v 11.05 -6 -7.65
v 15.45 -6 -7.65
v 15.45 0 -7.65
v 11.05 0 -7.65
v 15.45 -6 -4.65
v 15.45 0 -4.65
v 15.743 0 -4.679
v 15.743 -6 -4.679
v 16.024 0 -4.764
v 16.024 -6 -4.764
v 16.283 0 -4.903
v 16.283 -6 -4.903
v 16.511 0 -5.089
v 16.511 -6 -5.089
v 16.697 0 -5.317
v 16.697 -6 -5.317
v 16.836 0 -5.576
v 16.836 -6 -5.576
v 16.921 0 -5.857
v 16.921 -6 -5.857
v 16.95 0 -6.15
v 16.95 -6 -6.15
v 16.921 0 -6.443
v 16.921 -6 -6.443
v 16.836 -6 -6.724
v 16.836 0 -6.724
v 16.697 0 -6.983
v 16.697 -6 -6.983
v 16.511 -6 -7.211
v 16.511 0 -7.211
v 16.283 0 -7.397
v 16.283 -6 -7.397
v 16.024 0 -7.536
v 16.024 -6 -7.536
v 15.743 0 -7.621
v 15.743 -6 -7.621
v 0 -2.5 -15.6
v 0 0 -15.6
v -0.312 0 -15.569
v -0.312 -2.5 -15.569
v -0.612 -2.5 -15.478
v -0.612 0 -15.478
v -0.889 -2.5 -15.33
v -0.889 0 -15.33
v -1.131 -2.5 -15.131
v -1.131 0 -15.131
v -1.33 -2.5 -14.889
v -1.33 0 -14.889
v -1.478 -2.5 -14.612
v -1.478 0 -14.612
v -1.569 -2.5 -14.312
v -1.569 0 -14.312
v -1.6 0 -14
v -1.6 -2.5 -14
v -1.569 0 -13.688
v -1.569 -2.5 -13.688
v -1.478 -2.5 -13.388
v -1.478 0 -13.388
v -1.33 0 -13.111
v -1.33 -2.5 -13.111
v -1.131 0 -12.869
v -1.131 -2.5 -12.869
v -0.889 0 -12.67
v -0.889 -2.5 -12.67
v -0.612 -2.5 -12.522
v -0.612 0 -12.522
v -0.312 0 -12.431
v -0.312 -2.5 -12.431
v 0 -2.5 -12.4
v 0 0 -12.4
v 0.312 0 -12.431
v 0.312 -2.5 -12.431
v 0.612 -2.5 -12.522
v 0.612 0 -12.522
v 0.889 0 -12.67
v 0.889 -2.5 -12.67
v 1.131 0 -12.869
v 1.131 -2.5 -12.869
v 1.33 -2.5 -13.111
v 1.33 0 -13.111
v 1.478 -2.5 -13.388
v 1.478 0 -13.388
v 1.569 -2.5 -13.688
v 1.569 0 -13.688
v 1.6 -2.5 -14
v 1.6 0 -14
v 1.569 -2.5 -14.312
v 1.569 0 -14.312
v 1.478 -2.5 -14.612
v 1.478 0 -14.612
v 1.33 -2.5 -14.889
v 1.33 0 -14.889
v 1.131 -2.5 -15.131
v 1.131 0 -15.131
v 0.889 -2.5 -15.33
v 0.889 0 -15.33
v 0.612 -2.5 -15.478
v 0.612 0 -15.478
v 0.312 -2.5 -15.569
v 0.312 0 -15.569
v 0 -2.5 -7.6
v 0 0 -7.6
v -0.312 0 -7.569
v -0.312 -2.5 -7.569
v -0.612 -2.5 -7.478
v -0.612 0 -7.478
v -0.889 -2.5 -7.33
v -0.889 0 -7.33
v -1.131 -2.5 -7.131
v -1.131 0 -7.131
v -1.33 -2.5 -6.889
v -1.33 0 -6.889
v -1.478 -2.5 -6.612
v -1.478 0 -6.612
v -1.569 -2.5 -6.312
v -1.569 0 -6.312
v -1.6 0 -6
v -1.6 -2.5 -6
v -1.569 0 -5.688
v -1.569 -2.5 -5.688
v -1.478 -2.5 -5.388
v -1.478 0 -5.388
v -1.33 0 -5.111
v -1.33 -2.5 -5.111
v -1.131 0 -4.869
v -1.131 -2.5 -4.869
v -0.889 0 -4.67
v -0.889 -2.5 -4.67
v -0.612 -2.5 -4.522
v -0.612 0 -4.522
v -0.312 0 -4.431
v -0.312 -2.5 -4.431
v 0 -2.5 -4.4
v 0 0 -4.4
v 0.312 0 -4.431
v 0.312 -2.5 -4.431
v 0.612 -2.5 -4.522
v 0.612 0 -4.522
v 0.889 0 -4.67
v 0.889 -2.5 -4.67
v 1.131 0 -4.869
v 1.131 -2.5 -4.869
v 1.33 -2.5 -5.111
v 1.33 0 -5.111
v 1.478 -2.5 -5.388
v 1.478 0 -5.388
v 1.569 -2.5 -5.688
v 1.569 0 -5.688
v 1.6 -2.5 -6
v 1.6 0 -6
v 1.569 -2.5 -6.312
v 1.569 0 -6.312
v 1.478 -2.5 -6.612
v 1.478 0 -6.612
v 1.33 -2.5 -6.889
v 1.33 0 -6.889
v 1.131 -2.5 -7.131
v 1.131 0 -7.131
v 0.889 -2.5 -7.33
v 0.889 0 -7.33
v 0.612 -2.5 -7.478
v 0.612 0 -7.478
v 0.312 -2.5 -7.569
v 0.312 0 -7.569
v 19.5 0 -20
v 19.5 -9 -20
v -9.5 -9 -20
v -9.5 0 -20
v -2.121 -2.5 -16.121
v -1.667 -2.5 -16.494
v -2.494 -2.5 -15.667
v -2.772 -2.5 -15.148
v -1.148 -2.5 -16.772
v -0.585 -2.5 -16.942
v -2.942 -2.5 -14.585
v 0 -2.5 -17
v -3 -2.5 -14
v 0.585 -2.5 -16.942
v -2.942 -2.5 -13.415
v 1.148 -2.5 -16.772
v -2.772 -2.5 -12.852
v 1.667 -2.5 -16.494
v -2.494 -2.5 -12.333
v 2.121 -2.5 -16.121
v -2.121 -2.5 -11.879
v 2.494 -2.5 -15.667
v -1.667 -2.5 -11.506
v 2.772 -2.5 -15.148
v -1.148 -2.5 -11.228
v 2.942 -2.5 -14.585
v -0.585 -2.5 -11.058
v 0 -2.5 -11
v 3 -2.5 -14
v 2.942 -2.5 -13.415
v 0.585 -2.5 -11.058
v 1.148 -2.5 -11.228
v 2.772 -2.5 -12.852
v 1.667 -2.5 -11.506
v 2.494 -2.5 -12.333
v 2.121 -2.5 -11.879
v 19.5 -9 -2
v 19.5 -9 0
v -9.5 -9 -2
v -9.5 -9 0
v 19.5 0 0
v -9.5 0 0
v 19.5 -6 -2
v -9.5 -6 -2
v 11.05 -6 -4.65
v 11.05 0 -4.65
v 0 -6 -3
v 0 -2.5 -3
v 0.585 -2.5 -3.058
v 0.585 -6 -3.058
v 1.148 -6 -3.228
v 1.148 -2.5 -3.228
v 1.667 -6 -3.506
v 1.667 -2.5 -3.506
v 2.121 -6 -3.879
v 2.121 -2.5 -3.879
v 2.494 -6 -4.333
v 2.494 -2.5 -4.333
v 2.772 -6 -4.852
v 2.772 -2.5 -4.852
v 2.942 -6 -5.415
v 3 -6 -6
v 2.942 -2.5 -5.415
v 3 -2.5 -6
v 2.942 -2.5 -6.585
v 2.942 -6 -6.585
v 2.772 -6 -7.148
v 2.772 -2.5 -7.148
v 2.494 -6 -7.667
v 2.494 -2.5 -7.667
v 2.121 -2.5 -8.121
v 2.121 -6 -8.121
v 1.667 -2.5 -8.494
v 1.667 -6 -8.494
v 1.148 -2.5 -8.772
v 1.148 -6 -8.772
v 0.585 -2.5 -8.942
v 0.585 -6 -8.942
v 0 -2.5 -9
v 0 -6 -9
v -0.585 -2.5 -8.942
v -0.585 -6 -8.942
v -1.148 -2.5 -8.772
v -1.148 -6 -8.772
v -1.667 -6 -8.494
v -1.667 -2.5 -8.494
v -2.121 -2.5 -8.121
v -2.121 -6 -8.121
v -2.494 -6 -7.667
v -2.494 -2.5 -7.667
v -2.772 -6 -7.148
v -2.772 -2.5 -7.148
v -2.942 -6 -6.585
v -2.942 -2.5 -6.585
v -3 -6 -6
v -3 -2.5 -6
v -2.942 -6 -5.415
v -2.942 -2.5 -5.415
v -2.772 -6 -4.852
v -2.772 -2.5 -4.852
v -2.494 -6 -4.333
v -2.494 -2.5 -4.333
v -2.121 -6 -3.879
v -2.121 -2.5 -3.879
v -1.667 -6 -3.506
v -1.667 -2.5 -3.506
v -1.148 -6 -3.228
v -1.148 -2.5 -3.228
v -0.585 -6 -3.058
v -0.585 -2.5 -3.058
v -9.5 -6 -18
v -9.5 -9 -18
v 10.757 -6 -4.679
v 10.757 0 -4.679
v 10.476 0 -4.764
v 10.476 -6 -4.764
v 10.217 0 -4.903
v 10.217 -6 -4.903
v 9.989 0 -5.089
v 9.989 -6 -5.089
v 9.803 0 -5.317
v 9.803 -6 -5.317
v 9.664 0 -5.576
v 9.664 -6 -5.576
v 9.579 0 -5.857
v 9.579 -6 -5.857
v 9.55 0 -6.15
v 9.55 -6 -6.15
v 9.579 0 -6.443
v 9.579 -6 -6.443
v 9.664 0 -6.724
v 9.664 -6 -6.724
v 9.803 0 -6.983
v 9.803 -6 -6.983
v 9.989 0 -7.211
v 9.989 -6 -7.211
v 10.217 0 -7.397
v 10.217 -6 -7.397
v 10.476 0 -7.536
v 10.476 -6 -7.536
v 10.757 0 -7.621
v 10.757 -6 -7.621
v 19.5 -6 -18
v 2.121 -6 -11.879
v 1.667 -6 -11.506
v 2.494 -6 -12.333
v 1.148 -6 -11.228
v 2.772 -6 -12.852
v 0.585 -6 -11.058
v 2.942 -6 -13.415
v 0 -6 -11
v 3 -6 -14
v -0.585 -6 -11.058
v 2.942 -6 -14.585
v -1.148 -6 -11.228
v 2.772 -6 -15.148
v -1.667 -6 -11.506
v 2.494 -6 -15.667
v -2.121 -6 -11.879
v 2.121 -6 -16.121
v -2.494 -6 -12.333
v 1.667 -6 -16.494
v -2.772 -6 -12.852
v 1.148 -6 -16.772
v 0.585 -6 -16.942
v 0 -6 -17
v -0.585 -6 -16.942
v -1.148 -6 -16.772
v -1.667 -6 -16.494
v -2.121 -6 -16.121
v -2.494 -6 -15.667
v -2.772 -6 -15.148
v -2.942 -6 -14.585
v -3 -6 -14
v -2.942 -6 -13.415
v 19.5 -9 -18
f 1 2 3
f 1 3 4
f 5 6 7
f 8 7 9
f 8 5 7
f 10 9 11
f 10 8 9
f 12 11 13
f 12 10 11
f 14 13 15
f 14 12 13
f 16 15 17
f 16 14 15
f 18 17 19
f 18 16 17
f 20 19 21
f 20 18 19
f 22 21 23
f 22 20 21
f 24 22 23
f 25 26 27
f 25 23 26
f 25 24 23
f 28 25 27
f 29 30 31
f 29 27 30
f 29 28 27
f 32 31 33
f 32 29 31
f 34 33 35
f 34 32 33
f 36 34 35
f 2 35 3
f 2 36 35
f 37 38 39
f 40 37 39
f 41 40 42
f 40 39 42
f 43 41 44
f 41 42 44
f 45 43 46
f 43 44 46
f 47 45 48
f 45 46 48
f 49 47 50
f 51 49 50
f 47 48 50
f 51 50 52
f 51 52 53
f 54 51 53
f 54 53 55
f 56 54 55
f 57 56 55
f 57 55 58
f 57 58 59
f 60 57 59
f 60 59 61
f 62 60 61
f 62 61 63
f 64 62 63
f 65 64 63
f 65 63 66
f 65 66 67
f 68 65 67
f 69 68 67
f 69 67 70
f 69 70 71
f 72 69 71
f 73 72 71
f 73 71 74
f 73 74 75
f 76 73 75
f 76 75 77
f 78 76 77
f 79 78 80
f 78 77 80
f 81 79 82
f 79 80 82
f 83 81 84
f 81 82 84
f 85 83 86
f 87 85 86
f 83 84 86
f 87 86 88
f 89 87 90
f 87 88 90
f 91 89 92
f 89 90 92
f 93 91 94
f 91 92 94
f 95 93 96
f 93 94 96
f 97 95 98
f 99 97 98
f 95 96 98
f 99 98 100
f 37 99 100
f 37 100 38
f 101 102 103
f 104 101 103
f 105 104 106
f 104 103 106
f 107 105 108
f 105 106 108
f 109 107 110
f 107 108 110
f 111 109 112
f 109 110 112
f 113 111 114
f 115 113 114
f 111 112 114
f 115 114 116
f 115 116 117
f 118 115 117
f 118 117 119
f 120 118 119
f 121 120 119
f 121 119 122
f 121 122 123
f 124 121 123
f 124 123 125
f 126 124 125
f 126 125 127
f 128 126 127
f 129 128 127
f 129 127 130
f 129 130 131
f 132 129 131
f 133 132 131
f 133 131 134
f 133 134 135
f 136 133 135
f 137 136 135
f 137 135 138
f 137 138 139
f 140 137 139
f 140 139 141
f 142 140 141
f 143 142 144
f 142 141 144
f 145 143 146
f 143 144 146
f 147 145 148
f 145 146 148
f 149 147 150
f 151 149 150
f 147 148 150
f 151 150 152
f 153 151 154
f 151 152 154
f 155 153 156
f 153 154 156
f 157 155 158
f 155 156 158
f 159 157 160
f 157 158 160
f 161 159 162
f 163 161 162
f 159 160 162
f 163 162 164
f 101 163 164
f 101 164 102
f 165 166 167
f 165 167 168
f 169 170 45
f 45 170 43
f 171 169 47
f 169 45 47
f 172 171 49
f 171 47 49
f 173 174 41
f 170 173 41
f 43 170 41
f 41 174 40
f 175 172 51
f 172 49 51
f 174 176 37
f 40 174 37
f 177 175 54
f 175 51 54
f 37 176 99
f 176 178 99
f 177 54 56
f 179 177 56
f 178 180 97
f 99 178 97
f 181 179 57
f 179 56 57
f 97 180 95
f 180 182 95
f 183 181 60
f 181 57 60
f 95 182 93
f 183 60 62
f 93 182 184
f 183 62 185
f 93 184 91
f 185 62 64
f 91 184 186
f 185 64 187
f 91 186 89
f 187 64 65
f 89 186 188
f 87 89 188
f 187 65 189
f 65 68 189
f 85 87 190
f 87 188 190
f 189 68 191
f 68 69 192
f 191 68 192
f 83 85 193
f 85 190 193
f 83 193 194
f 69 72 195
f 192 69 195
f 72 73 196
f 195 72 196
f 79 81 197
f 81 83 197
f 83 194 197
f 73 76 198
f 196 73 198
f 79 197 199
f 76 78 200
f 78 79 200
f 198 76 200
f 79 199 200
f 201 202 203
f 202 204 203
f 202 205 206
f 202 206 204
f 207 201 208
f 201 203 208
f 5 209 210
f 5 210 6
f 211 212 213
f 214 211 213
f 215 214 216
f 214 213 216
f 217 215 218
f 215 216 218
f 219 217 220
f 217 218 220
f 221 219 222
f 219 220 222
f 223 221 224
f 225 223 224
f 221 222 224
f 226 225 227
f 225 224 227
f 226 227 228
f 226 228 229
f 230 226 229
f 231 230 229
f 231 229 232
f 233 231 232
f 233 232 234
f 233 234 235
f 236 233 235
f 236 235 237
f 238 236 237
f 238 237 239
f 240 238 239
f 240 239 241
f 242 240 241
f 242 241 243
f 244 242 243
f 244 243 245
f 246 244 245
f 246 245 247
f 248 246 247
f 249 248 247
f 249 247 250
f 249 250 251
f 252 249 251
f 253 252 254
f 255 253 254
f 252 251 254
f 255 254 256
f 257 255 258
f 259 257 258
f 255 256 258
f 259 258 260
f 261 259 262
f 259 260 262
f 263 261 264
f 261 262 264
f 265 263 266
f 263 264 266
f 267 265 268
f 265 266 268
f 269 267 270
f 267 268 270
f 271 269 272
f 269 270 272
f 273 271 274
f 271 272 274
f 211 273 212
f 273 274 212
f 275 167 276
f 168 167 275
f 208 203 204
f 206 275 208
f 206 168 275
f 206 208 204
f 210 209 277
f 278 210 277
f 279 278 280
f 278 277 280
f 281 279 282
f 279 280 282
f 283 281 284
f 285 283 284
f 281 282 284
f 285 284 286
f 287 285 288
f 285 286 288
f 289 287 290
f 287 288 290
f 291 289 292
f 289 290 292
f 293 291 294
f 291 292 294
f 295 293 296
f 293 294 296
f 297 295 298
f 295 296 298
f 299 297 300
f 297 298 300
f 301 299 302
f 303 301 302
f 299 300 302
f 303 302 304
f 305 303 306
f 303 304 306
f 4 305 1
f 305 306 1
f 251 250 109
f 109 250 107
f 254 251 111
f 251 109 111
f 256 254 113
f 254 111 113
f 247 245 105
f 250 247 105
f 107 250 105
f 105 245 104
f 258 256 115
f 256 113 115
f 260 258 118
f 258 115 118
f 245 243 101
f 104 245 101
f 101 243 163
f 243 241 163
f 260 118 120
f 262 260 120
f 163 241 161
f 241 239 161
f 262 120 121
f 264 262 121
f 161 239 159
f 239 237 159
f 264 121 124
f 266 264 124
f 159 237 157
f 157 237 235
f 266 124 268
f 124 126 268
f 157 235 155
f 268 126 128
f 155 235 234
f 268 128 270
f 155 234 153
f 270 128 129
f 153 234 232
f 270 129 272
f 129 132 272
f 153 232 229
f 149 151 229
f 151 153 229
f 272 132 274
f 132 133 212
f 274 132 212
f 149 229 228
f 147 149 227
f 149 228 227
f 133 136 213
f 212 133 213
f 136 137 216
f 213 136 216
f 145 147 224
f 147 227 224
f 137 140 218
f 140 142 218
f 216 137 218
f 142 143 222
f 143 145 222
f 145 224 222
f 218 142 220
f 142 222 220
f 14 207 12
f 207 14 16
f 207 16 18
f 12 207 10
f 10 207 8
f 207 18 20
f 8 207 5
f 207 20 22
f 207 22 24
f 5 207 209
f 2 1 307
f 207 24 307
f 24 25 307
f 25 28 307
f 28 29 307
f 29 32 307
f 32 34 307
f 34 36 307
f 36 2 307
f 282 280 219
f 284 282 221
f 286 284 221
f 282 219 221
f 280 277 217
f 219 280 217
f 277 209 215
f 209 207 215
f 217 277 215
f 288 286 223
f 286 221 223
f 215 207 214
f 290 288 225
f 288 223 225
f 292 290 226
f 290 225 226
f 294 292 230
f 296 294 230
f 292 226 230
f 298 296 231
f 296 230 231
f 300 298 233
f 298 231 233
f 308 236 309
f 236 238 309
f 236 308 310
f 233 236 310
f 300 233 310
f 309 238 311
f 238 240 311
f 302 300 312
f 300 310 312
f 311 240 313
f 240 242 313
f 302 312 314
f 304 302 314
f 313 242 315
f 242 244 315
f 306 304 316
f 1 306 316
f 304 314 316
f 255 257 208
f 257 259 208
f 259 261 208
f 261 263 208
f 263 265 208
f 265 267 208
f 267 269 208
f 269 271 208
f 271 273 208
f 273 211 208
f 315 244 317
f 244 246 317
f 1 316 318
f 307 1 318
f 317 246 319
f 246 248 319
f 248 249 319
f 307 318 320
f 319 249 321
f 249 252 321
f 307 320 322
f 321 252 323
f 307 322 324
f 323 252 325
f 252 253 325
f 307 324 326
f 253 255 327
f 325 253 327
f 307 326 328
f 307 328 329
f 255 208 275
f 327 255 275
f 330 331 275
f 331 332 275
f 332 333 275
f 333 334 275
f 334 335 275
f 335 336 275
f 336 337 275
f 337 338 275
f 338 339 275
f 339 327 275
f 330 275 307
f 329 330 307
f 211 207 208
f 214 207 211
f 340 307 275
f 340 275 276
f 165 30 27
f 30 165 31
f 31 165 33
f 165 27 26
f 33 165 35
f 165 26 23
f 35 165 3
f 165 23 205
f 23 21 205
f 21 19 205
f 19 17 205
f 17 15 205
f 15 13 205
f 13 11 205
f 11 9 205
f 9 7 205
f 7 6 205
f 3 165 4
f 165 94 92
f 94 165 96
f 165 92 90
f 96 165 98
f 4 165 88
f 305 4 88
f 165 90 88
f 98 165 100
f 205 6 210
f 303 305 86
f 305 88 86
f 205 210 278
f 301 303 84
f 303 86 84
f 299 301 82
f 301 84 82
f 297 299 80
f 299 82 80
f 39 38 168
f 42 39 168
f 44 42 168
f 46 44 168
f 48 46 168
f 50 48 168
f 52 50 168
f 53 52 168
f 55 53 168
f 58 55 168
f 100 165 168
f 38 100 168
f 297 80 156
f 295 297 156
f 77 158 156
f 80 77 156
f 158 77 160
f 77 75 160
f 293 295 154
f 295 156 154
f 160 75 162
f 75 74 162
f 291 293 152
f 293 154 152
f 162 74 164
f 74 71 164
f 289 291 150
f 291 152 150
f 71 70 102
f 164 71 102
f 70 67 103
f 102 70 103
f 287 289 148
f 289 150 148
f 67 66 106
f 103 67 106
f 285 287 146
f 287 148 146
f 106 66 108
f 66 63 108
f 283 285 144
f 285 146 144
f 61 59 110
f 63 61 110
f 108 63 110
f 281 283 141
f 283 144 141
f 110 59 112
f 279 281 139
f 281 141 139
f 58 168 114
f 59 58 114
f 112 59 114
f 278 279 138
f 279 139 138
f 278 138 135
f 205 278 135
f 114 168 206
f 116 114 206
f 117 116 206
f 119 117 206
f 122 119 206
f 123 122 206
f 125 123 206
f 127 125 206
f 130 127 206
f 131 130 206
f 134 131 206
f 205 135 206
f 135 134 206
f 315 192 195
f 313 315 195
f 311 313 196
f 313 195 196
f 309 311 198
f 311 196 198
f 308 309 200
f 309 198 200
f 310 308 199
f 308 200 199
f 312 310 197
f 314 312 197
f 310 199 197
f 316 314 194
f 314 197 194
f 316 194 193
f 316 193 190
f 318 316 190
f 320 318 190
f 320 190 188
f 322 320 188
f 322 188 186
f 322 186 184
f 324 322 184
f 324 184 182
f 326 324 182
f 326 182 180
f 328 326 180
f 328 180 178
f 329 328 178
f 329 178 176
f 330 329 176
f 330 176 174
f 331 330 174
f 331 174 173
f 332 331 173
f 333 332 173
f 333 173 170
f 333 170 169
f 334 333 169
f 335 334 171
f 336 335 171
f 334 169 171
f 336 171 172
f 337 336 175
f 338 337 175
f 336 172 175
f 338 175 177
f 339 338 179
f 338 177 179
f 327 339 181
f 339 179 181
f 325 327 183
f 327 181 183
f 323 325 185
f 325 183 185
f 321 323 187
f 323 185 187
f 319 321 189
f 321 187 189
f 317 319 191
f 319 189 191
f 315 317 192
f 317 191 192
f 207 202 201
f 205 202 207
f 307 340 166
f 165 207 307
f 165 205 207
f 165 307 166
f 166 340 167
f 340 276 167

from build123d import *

# Parameters (mm, degrees)
EXTRU_MINCE1_DEPTH      = 9.5
ESQUISSE2_R             = 1.6
ENL_V_MAT_EXTRU_1_DEPTH = 27.196373795
ENL_V_START             = -2.5
ESQUISSE4_R             = 3
ENL_V_MAT_EXTRU_3_DEPTH = 24.696373795
SKETCH2_W               = 19
SKETCH2_H               = 8
CUT_EXTRUDE2_DEPTH      = 22.960191256
SKETCH4_W               = 19
SKETCH4_H               = 2
BOSS_EXTRUDE2_DEPTH     = 3
BOSS_EXTRUDE3_DEPTH     = 10
SKETCH6_R               = 1.5
CUT_EXTRUDE3_DEPTH      = 29.570089254
CUT_EXTRUDE6_DEPTH      = 29.570089254
LPATTERN1_COUNT         = 2
LPATTERN1_PITCH         = 8


with BuildPart() as part:
    # Esquisse1 → Extru.-Mince1 (new, symmetric)
    with BuildSketch(Plane(origin=(0, 0, 0), x_dir=(0, 0, -1), z_dir=(1, 0, 0))):
        Polygon((20, 0), (0, 0), (0, -14), (6, -14), (6, -6), (20, -6), align=None)
    extrude(amount=EXTRU_MINCE1_DEPTH, both=True)

    # Esquisse2 → Enlèv. mat.-Extru.1 (cut, through all)
    with BuildSketch(Plane(origin=(0, 0, 0), x_dir=(1, 0, 0), z_dir=(0, 1, 0))):
        with Locations((0, 14)):
            Circle(ESQUISSE2_R)
    enl_v_mat_extru_1 = extrude(amount=-ENL_V_MAT_EXTRU_1_DEPTH, mode=Mode.SUBTRACT)

    # Esquisse4 → Enlèv. mat.-Extru.3 (cut, through all)
    with BuildSketch(Plane(origin=(0, 0, 0), x_dir=(1, 0, 0), z_dir=(0, 1, 0)).offset(ENL_V_START)):
        with Locations((0, 14)):
            Circle(ESQUISSE4_R)
    enl_v_mat_extru_3 = extrude(amount=-ENL_V_MAT_EXTRU_3_DEPTH, mode=Mode.SUBTRACT)

    # Sketch2 → Cut-Extrude2 (cut, through all)
    with BuildSketch(Plane(origin=(0, 0, -6), x_dir=(-1, 0, 0), z_dir=(0, 0, -1))):
        with Locations((0, -10)):
            Rectangle(SKETCH2_W, SKETCH2_H)
    extrude(amount=-CUT_EXTRUDE2_DEPTH, mode=Mode.SUBTRACT)

    # Sketch4 → Boss-Extrude2 (add)
    with BuildSketch(Plane.XZ.offset(6)):
        with Locations((0, -1)):
            Rectangle(SKETCH4_W, SKETCH4_H)
        with Locations((0, -19)):
            Rectangle(SKETCH4_W, SKETCH4_H)
    extrude(amount=BOSS_EXTRUDE2_DEPTH)

    # Sketch5 → Boss-Extrude3 (add)
    with BuildSketch(Plane(origin=(9.5, 0, 0), x_dir=(0, 0, -1), z_dir=(1, 0, 0))):
        Polygon((0, 0), (0, -9), (2, -9), (2, -6), (18, -6), (18, -9), (20, -9), (20, 0), align=None)
    extrude(amount=BOSS_EXTRUDE3_DEPTH)

    # Sketch6 → Cut-Extrude3 (cut, through all)
    with BuildSketch(Plane.XZ.offset(6)):
        with Locations((11.05, -6.15)):
            Circle(SKETCH6_R)
    extrude(amount=-CUT_EXTRUDE3_DEPTH, mode=Mode.SUBTRACT)

    # Sketch7 → Cut-Extrude6 (cut, through all)
    with BuildSketch(Plane.XZ.offset(6)):
        with BuildLine():
            Line((11.05, -4.65), (15.450055752, -4.65))
            ThreePointArc((15.450055752, -4.65), (16.950055752, -6.15), (15.450055752, -7.65))
            Line((15.450055752, -7.65), (11.05, -7.65))
            ThreePointArc((11.05, -7.65), (12.55, -6.15), (11.05, -4.65))
        make_face()
    extrude(amount=-CUT_EXTRUDE6_DEPTH, mode=Mode.SUBTRACT)

    # LPattern1: Enlèv. mat.-Extru.1, Enlèv. mat.-Extru.3 ×2
    with Locations(*[(0, 0, i * LPATTERN1_PITCH) for i in range(1, LPATTERN1_COUNT)]):
        add(enl_v_mat_extru_1, mode=Mode.SUBTRACT)
        add(enl_v_mat_extru_3, mode=Mode.SUBTRACT)


solid = part.part
